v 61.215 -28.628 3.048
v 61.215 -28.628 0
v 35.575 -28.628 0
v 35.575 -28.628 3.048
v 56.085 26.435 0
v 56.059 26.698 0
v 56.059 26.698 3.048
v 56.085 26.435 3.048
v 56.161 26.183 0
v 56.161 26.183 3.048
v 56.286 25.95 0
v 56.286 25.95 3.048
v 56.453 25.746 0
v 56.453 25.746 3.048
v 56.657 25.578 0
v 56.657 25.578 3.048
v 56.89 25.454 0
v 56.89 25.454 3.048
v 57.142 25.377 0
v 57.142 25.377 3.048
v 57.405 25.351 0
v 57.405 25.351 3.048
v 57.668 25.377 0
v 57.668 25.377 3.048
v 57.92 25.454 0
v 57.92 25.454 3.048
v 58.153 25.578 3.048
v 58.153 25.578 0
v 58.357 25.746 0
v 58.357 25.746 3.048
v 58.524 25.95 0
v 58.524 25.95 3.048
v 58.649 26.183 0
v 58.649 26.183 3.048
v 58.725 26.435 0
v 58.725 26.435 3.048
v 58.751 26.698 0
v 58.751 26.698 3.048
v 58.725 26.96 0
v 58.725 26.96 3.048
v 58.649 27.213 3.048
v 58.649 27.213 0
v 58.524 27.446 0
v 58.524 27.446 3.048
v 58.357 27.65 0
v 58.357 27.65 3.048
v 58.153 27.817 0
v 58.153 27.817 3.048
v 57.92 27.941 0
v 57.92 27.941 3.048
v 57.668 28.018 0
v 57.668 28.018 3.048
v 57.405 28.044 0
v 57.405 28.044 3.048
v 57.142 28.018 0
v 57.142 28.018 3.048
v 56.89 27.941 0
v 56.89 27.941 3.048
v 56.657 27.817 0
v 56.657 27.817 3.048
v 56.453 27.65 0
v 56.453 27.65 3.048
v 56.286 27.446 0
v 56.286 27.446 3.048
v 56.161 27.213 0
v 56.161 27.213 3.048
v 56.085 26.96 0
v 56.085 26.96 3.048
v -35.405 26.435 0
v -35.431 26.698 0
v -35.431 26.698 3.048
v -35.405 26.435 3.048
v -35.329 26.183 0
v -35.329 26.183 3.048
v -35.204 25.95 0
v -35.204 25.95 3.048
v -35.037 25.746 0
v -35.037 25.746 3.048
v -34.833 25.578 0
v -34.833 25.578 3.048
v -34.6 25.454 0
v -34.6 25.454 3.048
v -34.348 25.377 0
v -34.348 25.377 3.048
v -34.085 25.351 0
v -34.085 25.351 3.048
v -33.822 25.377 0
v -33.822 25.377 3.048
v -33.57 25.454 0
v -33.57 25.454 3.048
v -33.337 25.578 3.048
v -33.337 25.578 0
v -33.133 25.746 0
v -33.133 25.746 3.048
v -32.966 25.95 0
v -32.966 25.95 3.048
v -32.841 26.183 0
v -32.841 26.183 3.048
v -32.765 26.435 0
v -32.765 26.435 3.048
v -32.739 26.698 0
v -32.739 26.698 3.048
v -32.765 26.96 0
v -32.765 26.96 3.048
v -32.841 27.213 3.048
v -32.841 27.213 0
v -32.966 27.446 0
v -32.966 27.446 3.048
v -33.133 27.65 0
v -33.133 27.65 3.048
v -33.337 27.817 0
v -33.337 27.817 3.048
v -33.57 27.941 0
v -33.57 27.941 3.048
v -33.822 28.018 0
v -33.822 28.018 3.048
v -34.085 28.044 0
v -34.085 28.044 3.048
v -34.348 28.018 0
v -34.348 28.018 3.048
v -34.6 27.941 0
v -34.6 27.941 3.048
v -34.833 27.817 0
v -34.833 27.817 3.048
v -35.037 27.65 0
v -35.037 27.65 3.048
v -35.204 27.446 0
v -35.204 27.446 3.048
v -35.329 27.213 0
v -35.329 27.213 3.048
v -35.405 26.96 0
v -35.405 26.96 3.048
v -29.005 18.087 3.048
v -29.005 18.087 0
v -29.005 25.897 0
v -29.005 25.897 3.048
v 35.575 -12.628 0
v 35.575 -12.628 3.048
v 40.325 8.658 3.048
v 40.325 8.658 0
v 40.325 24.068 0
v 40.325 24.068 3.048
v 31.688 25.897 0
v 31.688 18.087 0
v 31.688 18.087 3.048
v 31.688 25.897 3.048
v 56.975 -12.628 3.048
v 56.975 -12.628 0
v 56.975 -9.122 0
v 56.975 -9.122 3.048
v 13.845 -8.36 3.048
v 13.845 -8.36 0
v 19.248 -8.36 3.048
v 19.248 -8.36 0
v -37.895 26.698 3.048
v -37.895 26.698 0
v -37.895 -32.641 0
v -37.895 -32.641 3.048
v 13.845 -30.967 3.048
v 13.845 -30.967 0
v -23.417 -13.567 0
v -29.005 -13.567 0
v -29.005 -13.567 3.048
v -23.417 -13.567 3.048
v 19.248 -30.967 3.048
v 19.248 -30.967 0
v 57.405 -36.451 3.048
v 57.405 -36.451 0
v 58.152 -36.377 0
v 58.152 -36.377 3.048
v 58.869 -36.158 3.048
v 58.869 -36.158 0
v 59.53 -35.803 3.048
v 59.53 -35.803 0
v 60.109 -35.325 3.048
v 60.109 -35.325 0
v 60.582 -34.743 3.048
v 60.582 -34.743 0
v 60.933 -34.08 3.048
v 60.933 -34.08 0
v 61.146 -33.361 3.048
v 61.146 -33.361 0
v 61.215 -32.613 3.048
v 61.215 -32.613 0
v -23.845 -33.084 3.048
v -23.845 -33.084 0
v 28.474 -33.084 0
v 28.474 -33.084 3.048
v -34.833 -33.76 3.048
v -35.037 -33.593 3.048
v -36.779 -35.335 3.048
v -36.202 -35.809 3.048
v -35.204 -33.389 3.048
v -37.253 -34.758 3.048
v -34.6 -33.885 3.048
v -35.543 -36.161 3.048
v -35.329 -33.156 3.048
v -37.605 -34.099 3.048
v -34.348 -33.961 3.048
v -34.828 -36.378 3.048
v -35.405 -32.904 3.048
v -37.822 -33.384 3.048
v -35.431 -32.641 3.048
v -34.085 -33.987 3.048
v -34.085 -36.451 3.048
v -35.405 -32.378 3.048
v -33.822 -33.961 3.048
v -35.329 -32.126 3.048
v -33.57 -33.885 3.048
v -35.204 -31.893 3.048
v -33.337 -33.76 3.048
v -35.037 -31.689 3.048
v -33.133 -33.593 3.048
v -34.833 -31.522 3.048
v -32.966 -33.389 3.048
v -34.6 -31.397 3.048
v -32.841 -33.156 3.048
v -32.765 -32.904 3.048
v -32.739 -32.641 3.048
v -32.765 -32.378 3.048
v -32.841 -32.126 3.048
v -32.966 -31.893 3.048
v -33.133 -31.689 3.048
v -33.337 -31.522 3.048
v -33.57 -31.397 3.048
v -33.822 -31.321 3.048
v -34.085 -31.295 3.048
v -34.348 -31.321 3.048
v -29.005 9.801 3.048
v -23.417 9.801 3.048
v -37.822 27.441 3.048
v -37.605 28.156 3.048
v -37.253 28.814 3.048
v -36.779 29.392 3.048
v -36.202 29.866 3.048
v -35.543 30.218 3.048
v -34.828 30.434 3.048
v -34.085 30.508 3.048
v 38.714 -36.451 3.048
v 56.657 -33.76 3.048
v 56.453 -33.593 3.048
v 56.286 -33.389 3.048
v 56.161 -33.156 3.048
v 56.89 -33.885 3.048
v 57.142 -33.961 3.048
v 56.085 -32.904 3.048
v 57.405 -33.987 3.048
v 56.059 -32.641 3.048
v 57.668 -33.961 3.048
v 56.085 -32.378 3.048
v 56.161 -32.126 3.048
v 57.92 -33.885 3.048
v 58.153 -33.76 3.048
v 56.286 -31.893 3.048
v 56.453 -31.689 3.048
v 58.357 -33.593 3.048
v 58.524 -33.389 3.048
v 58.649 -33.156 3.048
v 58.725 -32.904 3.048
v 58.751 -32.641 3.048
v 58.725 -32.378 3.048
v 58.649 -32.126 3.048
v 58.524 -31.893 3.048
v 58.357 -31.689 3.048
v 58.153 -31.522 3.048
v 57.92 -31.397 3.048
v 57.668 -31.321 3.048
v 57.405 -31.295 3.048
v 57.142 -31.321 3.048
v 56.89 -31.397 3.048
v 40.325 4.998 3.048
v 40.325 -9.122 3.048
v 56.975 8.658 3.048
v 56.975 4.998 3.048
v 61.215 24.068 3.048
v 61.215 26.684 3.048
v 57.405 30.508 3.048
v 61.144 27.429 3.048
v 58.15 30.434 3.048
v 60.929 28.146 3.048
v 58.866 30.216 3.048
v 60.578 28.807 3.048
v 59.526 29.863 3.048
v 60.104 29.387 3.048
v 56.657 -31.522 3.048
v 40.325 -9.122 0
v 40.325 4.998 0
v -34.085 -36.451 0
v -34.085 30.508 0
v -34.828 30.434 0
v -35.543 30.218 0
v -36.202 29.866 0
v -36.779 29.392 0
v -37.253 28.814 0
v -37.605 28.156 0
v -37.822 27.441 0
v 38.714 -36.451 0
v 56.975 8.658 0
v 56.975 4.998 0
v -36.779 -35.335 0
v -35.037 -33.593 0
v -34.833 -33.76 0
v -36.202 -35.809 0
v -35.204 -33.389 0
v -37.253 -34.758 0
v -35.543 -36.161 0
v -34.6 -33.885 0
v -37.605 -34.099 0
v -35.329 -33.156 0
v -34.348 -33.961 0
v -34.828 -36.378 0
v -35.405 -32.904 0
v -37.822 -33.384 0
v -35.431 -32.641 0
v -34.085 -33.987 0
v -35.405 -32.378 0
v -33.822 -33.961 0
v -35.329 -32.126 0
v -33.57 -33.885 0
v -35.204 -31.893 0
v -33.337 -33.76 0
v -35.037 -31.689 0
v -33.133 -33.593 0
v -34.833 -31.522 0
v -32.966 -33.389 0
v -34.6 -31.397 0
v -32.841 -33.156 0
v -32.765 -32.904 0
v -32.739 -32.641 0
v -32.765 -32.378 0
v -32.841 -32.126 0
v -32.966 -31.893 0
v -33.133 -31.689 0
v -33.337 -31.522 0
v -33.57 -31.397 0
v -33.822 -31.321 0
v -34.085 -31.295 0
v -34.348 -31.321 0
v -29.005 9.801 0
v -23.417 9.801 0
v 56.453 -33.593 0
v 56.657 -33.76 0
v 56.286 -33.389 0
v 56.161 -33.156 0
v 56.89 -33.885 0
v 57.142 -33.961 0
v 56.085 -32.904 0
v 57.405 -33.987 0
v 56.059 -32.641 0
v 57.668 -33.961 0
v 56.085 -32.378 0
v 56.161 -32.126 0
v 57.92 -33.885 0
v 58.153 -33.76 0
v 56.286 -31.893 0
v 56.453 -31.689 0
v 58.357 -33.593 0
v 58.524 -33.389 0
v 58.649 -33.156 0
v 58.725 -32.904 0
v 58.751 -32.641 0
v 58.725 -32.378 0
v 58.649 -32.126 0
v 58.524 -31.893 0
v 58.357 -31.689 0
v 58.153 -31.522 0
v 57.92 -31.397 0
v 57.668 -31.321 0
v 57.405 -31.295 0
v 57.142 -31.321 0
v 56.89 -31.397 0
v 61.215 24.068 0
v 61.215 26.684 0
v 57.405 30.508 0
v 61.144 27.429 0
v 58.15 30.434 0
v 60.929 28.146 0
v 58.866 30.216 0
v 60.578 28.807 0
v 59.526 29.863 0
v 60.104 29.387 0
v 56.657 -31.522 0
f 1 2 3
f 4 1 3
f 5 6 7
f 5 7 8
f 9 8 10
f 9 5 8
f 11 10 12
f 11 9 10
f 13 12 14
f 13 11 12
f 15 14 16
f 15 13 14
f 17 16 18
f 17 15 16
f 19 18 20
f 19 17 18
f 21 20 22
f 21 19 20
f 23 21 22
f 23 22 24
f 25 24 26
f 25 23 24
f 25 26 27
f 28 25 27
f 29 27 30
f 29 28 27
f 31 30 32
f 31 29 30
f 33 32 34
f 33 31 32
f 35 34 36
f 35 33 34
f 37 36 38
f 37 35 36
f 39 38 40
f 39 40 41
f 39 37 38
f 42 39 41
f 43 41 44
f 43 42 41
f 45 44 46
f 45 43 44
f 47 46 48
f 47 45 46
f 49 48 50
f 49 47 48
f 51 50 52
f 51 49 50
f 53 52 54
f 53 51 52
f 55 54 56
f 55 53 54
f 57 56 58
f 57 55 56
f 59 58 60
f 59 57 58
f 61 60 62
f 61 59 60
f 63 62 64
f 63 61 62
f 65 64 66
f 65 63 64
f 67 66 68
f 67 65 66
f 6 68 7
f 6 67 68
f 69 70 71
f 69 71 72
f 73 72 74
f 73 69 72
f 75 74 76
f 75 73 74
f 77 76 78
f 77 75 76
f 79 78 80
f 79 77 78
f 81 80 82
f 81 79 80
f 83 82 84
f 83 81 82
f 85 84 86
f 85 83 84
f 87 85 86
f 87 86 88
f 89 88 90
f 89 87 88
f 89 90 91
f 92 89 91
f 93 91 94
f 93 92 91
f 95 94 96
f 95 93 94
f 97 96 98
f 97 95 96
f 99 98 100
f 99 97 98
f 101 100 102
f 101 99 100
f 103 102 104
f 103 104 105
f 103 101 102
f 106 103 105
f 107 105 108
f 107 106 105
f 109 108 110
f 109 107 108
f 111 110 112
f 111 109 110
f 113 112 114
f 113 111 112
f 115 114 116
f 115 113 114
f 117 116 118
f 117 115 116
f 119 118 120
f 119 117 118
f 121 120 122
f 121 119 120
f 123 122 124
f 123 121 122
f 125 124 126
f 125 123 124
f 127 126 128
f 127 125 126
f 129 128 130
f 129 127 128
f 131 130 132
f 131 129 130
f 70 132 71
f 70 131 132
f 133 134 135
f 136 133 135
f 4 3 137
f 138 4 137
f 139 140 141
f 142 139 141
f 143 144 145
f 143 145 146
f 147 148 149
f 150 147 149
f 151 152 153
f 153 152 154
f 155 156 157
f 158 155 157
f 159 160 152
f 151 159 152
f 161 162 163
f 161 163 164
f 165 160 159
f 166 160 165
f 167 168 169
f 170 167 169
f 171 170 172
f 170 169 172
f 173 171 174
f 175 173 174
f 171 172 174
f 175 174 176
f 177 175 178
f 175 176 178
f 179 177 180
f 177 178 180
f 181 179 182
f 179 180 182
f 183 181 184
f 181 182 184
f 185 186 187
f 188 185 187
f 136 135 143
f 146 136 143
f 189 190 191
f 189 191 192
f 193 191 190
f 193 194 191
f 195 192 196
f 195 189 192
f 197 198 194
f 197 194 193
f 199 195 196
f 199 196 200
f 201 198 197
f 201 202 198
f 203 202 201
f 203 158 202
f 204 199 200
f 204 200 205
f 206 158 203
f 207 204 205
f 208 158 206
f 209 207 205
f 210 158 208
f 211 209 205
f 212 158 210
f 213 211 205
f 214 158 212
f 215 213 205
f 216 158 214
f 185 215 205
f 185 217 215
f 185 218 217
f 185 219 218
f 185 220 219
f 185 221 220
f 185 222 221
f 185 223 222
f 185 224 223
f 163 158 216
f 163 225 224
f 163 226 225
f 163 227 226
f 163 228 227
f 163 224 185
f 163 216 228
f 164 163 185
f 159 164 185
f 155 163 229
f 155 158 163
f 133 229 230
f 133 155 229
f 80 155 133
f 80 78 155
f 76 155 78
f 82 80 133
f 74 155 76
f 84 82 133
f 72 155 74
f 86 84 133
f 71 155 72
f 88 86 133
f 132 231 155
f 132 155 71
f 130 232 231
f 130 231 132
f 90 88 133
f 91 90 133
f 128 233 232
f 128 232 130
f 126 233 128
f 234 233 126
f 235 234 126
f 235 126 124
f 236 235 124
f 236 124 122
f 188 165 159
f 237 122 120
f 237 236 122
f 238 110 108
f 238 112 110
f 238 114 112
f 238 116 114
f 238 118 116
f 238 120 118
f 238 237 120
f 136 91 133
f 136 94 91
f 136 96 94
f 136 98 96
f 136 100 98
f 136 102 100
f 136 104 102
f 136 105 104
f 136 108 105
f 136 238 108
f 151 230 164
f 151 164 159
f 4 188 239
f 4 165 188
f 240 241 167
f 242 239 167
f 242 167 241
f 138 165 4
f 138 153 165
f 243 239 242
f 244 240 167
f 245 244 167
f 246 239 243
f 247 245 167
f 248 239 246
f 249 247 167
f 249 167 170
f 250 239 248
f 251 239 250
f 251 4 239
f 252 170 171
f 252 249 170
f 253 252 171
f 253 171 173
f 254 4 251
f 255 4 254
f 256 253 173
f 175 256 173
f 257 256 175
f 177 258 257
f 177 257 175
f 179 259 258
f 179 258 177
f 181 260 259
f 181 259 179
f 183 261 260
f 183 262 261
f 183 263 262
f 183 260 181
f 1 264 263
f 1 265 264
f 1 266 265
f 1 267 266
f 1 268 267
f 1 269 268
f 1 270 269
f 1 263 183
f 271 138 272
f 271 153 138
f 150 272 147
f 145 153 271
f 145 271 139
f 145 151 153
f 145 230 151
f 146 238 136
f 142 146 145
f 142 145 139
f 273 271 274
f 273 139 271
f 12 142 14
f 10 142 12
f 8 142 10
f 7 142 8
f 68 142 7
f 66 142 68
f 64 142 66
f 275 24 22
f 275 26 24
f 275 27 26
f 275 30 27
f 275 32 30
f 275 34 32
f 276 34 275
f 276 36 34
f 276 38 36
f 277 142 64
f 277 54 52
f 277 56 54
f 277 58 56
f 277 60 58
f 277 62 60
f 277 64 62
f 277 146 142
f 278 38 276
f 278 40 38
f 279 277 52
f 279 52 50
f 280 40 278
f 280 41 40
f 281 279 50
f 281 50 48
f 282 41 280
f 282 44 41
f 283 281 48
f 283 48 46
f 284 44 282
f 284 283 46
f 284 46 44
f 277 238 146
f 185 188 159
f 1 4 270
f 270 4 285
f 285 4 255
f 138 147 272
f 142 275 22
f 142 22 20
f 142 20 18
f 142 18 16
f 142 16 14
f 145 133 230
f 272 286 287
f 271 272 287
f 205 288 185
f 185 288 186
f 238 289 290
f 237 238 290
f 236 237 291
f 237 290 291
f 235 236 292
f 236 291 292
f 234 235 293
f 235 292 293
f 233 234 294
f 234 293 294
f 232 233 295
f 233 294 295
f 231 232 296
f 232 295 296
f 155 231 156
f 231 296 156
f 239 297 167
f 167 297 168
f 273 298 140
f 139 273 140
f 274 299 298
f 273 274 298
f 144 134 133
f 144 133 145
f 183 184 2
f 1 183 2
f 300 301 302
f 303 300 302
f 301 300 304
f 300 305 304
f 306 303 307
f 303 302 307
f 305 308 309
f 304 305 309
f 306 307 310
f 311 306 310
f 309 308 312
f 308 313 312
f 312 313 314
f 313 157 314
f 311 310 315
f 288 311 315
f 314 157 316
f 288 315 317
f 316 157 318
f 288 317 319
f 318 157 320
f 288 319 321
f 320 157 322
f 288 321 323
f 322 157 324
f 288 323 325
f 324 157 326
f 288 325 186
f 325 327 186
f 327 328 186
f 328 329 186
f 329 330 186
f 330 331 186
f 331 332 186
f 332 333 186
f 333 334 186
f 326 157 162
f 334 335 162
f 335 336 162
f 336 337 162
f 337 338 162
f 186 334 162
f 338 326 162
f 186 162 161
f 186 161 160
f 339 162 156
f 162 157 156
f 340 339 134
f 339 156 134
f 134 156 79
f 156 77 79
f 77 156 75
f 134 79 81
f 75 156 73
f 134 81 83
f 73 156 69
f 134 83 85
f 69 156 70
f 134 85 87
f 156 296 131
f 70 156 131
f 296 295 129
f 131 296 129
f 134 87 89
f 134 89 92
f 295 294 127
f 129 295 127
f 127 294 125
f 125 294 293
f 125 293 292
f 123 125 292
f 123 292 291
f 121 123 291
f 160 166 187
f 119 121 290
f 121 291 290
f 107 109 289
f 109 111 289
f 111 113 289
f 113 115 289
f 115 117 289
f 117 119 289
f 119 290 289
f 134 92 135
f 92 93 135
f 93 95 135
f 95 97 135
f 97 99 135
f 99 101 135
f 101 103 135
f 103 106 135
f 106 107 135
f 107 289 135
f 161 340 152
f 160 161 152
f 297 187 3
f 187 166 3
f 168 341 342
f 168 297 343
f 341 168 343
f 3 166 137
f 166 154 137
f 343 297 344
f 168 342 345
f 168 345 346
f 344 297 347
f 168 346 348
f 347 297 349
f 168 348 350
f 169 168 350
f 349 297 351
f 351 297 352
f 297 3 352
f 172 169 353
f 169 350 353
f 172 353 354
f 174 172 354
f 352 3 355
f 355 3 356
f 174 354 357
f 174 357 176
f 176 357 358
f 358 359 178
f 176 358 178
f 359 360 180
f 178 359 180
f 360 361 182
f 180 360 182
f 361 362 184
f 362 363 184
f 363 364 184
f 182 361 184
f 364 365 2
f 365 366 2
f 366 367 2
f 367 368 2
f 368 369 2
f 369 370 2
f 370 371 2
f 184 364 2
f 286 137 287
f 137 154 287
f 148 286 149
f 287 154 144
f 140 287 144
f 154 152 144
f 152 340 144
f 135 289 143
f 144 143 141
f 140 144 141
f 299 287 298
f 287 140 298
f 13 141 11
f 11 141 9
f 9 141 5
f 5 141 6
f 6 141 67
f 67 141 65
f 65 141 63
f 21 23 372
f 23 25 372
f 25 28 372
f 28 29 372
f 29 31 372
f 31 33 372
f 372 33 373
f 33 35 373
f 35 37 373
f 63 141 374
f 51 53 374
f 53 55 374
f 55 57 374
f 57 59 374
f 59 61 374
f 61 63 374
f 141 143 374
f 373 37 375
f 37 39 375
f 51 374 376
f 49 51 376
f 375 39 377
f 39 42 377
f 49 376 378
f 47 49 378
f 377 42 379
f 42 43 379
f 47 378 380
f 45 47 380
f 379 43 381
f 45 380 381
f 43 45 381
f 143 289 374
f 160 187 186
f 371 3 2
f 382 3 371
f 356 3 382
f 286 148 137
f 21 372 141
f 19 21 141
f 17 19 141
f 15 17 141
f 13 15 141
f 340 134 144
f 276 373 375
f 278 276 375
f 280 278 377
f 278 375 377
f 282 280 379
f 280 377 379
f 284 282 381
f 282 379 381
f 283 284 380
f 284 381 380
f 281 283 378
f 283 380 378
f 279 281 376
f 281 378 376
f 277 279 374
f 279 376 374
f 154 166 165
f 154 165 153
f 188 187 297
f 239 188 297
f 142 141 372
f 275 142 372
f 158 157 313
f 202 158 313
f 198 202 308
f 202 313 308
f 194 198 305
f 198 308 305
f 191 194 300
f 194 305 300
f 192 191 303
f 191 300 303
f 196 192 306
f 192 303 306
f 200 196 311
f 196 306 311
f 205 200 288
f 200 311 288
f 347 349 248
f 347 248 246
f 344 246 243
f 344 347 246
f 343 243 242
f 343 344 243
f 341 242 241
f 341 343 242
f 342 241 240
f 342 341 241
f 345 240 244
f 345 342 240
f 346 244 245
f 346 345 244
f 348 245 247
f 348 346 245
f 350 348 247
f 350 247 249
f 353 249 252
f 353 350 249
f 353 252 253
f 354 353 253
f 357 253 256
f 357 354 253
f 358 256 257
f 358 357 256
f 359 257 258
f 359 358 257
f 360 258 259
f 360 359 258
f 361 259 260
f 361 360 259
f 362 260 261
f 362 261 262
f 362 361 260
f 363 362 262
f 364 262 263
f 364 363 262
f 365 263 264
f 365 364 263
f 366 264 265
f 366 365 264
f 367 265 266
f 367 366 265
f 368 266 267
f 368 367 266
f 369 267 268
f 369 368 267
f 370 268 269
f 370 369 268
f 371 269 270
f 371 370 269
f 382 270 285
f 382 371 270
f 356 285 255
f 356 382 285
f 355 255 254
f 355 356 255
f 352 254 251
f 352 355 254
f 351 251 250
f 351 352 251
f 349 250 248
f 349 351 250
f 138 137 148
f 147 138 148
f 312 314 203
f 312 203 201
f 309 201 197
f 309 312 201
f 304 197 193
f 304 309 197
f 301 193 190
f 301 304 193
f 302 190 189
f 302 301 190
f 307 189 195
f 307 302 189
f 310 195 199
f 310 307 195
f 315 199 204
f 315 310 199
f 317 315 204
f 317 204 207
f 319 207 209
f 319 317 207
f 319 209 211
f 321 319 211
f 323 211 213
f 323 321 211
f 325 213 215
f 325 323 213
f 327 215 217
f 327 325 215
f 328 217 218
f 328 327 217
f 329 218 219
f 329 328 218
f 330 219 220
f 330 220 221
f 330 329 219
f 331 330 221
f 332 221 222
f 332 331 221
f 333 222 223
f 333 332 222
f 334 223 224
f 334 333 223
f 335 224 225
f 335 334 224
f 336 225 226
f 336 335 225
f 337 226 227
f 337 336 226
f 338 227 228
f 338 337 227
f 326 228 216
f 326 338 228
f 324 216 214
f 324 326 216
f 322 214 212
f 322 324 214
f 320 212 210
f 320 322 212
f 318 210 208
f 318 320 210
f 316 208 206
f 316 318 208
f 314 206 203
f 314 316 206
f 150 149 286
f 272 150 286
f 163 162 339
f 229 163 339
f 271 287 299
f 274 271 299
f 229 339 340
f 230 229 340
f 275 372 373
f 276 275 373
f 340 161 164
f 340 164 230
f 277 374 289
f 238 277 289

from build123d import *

# Parameters (mm, degrees)
SKETCH1_R           = 1.3462
SKETCH1_W           = 5.4034
SKETCH1_H           = 22.6066
SKETCH1_W_2         = 60.6932
SKETCH1_H_2         = 7.81
SKETCH1_W_3         = 5.588
SKETCH1_H_3         = 23.368
BOSS_EXTRUDE1_DEPTH = 3.048


with BuildPart() as part:
    # Sketch1 → Boss-Extrude1 (new body)
    with BuildSketch(Plane.XY):
        with BuildLine():
            Line((57.404932375, 30.507694304), (-34.084892625, 30.507694304))
            ThreePointArc((-34.084892625, 30.507694304), (-36.778969461, 29.391771141), (-37.894892625, 26.697694304))
            Line((-37.894892625, 26.697694304), (-37.894892625, -32.641005696))
            ThreePointArc((-37.894892625, -32.641005696), (-36.778969461, -35.335082532), (-34.084892625, -36.451005696))
            Line((-34.084892625, -36.451005696), (-23.844892625, -33.084405696))
            Line((-23.844892625, -33.084405696), (28.474307375, -33.084405696))
            Line((28.474307375, -33.084405696), (38.714307375, -36.451005696))
            Line((38.714307375, -36.451005696), (57.405007375, -36.451005696))
            ThreePointArc((57.405007375, -36.451005696), (60.108826144, -35.325305244), (61.214907375, -32.613401529))
            Line((61.214907375, -32.613401529), (61.214907375, -28.627805696))
            Line((61.214907375, -28.627805696), (35.575007375, -28.627805696))
            Line((35.575007375, -28.627805696), (35.575007375, -12.628005696))
            Line((35.575007375, -12.628005696), (56.975007375, -12.628005696))
            Line((56.975007375, -12.628005696), (56.975007375, -9.121805696))
            Line((56.975007375, -9.121805696), (40.325007375, -9.121805696))
            Line((40.325007375, -9.121805696), (40.325007375, 4.997894304))
            Line((40.325007375, 4.997894304), (56.975007375, 4.997894304))
            Line((56.975007375, 4.997894304), (56.975007375, 8.658194304))
            Line((56.975007375, 8.658194304), (40.325007375, 8.658194304))
            Line((40.325007375, 8.658194304), (40.325007375, 24.068294304))
            Line((40.325007375, 24.068294304), (61.214907375, 24.068294304))
            Line((61.214907375, 24.068294304), (61.214907375, 26.683892153))
            ThreePointArc((61.214907375, 26.683892153), (60.103884597, 29.386886916), (57.404932375, 30.507694304))
        make_face()
        with Locations(Location((57.405007375, -32.641005696, 0), (0, 0, 180))):
            Circle(SKETCH1_R, mode=Mode.SUBTRACT)
        with Locations(Location((-34.084892625, -32.641005696, 0), (0, 0, 180))):
            Circle(SKETCH1_R, mode=Mode.SUBTRACT)
        with Locations(Location((-34.084892625, 26.697694304, 0), (0, 0, 180))):
            Circle(SKETCH1_R, mode=Mode.SUBTRACT)
        with Locations(Location((57.404932375, 26.697694304, 0), (0, 0, 180))):
            Circle(SKETCH1_R, mode=Mode.SUBTRACT)
        with Locations((16.546707375, -19.663505696)):
            Rectangle(SKETCH1_W, SKETCH1_H, mode=Mode.SUBTRACT)
        with Locations((1.341707375, 21.991994304)):
            Rectangle(SKETCH1_W_2, SKETCH1_H_2, mode=Mode.SUBTRACT)
        with Locations((-26.210892625, -1.882805696)):
            Rectangle(SKETCH1_W_3, SKETCH1_H_3, mode=Mode.SUBTRACT)
    extrude(amount=BOSS_EXTRUDE1_DEPTH)


solid = part.part
